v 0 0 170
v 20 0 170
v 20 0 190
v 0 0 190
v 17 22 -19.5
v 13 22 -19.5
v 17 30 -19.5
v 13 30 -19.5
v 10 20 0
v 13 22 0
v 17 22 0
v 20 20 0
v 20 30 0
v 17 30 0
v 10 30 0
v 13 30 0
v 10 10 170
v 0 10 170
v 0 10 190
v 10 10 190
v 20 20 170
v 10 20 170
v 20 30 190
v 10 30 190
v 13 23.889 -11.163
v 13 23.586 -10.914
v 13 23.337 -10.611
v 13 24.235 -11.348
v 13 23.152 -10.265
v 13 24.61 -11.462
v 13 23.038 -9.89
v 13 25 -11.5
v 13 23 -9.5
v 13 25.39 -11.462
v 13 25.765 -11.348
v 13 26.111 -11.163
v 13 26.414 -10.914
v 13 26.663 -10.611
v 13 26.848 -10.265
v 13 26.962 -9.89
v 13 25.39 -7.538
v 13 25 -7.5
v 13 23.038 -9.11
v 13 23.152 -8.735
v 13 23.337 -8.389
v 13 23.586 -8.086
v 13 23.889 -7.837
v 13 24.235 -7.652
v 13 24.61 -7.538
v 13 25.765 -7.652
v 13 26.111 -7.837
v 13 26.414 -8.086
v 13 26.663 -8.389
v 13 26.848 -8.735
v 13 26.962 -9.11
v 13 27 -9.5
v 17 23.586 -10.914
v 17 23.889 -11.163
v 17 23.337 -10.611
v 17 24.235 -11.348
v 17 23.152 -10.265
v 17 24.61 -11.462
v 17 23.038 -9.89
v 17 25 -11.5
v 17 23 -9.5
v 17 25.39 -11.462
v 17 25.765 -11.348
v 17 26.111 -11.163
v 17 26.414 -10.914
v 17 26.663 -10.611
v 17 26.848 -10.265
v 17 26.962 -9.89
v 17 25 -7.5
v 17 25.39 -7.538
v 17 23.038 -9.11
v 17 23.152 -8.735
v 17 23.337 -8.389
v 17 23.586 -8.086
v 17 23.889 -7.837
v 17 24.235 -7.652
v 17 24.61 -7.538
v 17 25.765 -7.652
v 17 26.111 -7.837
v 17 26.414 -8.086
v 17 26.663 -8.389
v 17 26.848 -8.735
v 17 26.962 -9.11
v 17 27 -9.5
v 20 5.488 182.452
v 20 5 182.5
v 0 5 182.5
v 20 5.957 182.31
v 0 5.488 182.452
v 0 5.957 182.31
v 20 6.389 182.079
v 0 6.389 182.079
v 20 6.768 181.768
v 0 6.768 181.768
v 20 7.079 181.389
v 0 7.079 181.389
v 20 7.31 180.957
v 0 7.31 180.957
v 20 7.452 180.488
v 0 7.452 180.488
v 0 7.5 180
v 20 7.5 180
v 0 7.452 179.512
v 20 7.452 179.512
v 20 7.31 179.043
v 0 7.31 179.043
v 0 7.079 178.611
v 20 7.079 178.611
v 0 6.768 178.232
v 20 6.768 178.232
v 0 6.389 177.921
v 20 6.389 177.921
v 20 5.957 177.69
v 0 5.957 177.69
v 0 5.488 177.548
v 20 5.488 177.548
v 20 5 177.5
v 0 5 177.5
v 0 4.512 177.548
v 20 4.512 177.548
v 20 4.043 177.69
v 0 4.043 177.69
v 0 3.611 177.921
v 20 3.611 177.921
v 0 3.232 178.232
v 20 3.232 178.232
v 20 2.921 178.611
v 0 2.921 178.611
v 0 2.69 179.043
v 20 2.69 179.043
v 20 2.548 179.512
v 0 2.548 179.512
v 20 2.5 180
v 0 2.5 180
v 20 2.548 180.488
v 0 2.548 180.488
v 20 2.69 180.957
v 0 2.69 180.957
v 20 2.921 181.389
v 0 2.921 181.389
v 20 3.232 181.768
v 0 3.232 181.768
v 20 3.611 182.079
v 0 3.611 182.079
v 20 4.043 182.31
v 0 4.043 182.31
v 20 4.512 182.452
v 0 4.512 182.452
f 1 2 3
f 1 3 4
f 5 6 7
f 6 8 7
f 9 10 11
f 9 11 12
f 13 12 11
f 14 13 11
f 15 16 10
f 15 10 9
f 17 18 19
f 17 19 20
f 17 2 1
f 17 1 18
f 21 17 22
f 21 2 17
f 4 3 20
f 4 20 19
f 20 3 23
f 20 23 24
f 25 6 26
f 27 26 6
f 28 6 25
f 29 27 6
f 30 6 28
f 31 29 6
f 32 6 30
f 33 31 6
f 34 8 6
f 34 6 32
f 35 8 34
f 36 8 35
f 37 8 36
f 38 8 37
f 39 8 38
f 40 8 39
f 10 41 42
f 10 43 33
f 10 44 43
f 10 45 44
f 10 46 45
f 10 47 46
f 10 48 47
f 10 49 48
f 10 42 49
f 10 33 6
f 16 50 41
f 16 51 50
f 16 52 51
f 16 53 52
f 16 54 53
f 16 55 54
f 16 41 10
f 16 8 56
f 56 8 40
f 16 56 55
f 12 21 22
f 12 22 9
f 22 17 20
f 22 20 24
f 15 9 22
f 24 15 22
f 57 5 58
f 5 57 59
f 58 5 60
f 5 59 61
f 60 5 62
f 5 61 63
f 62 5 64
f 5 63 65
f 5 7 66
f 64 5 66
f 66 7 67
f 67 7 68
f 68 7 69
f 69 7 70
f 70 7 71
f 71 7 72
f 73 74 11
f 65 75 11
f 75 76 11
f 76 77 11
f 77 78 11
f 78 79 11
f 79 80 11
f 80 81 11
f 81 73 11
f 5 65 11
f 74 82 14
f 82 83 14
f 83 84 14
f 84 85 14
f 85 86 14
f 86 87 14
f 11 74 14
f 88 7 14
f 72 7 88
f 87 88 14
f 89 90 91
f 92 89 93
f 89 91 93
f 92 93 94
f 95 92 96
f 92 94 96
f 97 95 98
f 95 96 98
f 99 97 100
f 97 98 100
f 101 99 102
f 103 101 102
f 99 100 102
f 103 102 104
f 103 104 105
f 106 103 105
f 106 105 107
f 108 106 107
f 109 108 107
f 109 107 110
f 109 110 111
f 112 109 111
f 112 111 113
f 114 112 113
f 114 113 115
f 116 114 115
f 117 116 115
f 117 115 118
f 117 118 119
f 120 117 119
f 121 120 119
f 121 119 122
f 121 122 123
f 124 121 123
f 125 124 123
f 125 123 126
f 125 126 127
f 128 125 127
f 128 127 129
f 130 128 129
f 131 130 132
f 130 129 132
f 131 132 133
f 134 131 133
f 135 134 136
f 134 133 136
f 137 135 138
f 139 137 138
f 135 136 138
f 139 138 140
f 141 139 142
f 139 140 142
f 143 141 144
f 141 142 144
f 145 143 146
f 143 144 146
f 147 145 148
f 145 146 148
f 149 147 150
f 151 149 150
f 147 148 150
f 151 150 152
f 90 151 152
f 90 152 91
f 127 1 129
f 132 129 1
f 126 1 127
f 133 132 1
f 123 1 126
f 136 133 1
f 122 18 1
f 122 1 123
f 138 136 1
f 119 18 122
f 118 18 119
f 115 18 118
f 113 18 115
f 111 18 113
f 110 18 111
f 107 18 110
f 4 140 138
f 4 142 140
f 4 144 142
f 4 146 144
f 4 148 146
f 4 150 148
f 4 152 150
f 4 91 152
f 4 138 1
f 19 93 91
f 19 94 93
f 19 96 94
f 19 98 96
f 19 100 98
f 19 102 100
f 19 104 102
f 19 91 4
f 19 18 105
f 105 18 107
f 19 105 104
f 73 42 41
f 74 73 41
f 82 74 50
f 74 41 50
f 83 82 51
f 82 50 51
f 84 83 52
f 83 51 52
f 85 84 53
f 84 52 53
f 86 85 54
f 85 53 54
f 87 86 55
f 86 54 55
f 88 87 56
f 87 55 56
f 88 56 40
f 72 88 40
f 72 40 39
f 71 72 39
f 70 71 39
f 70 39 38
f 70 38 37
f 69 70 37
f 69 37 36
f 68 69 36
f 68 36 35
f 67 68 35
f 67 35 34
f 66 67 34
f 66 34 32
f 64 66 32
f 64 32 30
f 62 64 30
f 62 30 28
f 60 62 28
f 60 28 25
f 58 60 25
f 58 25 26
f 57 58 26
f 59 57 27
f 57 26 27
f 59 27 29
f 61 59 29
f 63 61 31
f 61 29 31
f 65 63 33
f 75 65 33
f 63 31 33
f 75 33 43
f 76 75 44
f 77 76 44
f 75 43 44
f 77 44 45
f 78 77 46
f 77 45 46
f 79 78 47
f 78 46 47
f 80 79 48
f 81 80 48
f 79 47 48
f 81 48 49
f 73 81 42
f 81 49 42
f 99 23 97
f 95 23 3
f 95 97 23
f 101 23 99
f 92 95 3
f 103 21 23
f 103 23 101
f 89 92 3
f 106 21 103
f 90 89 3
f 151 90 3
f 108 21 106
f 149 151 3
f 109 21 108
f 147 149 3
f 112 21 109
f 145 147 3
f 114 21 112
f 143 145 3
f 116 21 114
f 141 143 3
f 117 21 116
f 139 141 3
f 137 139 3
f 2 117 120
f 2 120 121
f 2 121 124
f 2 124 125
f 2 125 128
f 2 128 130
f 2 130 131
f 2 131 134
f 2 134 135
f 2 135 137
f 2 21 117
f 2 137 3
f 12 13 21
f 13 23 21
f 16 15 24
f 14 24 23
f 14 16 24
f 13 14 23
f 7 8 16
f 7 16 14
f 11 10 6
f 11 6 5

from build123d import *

# Parameters (mm, degrees)
BOSS_EXTRUDE1_DEPTH = 190
SKETCH3_W           = 170
SKETCH3_H           = 20
CUT_EXTRUDE1_DEPTH  = 190
SKETCH4_W           = 4
SKETCH4_H           = 5
BOSS_EXTRUDE2_DEPTH = 19.5
SKETCH5_R           = 2.75
CUT_EXTRUDE3_DEPTH  = 10
SKETCH7_W           = 4
SKETCH7_H           = 19.5
BOSS_EXTRUDE3_DEPTH = 3
BOSS_EXTRUDE4_REACH = 195.391
SKETCH8_R           = 2.75
SKETCH8_R_2         = 2.5
SKETCH9_R           = 2.5
CUT_EXTRUDE4_DEPTH  = 194.390796058
SKETCH10_R          = 2
CUT_EXTRUDE5_DEPTH  = 193.792634714


with BuildPart() as part:
    # Sketch2 → Boss-Extrude1 (new body)
    with BuildSketch(Plane.XY):
        Polygon((0, 0), (0, 10), (10, 10), (10, 30), (20, 30), (20, 0), align=None)
    extrude(amount=BOSS_EXTRUDE1_DEPTH)

    # Sketch3 → Cut-Extrude1 (cut)
    with BuildSketch(Plane(origin=(20, 0, 0), x_dir=(0, 0, -1), z_dir=(1, 0, 0))):
        with Locations((-85, 10)):
            Rectangle(SKETCH3_W, SKETCH3_H)
    extrude(amount=-CUT_EXTRUDE1_DEPTH, mode=Mode.SUBTRACT)

    # Sketch4 → Boss-Extrude2 (add)
    with BuildSketch(Plane(origin=(0, 0, 0), x_dir=(-1, 0, 0), z_dir=(0, 0, -1))):
        with Locations((-15, 27.5)):
            Rectangle(SKETCH4_W, SKETCH4_H)
    extrude(amount=BOSS_EXTRUDE2_DEPTH)

    # Sketch5 → Cut-Extrude3 (cut)
    with BuildSketch(Plane.ZY):
        with Locations((180, 5)):
            Circle(SKETCH5_R)
    extrude(amount=-CUT_EXTRUDE3_DEPTH, mode=Mode.SUBTRACT)

    # Sketch7 → Boss-Extrude3 (add)
    with BuildSketch(Plane.XZ.offset(-25)):
        with Locations((15, -9.75)):
            Rectangle(SKETCH7_W, SKETCH7_H)
    extrude(amount=BOSS_EXTRUDE3_DEPTH)

    # Sketch8 → Boss-Extrude4 (add, up to next)
    with BuildSketch(Plane.ZY, mode=Mode.PRIVATE) as boss_extrude4_sk1:
        with Locations((180, 5)):
            Circle(SKETCH8_R)
        with Locations((180, 5)):
            Circle(SKETCH8_R_2, mode=Mode.SUBTRACT)
    boss_extrude4_tool1 = extrude(boss_extrude4_sk1.sketch, amount=-BOSS_EXTRUDE4_REACH, mode=Mode.PRIVATE) - part.part
    add(boss_extrude4_tool1.solids().sort_by_distance((0, 5, 177.327782))[0])

    # Sketch9 → Cut-Extrude4 (cut, through all)
    with BuildSketch(Plane.ZY):
        with Locations((180, 5)):
            Circle(SKETCH9_R)
    extrude(amount=-CUT_EXTRUDE4_DEPTH, mode=Mode.SUBTRACT)

    # Sketch10 → Cut-Extrude5 (cut, through all)
    with BuildSketch(Plane.ZY.offset(-13)):
        with Locations((-9.5, 25)):
            Circle(SKETCH10_R)
    extrude(amount=-CUT_EXTRUDE5_DEPTH, mode=Mode.SUBTRACT)


solid = part.part
